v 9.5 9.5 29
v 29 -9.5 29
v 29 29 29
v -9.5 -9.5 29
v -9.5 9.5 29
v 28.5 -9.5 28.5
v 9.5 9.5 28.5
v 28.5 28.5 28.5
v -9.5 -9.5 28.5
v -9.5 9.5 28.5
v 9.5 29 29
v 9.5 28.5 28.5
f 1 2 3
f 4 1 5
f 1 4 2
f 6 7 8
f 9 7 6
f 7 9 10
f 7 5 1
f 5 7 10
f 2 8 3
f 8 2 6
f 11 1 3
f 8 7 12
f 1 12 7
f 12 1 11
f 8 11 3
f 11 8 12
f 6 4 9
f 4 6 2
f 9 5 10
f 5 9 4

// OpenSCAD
module selector(nblocks, block_size, margin, left, right, back) {
    x0 = block_size * (nblocks / 2 - back);
    dx = block_size * back + margin;
    y0 = block_size * left;
    dy = block_size * (right - left);
    z0 = block_size * nblocks / 2;
    dz = margin;
    l = nblocks * block_size * 2;
    difference() {
        translate([x0, y0, z0]) cube([dx, dy, dz]);
        rotate([-90, 0, 45]) translate([-l / 2, -l / 2, 0]) cube([l, l, l / 2]);
        rotate([90, 0, -45]) translate([-l / 2, -l / 2, 0]) cube([l, l, l / 2]);
        rotate([0, 135, 0]) translate([-l / 2, -l / 2, 0]) cube([l, l, l / 2]);
    }
}
module center_selector(nblocks, block_size, margin, back) {
    dx = block_size * (nblocks - back * 2);
    z0 = nblocks * block_size / 2;
    translate([-dx / 2, -dx / 2, z0]) cube([dx, dx, margin]);
}

color("Red", 0.5) selector(3, 19, 0.5, 0.5, 2, 1);
color("Blue", 0.5) rotate([0, 0, 90]) selector(3, 19, 0.5, -2, -0.5, 1);
color("Blue", 0.5) selector(3, 19, 0.5, -0.5, 0.5, 1);
color("Green", 0.5) center_selector(3, 19, 0.5, 1);
